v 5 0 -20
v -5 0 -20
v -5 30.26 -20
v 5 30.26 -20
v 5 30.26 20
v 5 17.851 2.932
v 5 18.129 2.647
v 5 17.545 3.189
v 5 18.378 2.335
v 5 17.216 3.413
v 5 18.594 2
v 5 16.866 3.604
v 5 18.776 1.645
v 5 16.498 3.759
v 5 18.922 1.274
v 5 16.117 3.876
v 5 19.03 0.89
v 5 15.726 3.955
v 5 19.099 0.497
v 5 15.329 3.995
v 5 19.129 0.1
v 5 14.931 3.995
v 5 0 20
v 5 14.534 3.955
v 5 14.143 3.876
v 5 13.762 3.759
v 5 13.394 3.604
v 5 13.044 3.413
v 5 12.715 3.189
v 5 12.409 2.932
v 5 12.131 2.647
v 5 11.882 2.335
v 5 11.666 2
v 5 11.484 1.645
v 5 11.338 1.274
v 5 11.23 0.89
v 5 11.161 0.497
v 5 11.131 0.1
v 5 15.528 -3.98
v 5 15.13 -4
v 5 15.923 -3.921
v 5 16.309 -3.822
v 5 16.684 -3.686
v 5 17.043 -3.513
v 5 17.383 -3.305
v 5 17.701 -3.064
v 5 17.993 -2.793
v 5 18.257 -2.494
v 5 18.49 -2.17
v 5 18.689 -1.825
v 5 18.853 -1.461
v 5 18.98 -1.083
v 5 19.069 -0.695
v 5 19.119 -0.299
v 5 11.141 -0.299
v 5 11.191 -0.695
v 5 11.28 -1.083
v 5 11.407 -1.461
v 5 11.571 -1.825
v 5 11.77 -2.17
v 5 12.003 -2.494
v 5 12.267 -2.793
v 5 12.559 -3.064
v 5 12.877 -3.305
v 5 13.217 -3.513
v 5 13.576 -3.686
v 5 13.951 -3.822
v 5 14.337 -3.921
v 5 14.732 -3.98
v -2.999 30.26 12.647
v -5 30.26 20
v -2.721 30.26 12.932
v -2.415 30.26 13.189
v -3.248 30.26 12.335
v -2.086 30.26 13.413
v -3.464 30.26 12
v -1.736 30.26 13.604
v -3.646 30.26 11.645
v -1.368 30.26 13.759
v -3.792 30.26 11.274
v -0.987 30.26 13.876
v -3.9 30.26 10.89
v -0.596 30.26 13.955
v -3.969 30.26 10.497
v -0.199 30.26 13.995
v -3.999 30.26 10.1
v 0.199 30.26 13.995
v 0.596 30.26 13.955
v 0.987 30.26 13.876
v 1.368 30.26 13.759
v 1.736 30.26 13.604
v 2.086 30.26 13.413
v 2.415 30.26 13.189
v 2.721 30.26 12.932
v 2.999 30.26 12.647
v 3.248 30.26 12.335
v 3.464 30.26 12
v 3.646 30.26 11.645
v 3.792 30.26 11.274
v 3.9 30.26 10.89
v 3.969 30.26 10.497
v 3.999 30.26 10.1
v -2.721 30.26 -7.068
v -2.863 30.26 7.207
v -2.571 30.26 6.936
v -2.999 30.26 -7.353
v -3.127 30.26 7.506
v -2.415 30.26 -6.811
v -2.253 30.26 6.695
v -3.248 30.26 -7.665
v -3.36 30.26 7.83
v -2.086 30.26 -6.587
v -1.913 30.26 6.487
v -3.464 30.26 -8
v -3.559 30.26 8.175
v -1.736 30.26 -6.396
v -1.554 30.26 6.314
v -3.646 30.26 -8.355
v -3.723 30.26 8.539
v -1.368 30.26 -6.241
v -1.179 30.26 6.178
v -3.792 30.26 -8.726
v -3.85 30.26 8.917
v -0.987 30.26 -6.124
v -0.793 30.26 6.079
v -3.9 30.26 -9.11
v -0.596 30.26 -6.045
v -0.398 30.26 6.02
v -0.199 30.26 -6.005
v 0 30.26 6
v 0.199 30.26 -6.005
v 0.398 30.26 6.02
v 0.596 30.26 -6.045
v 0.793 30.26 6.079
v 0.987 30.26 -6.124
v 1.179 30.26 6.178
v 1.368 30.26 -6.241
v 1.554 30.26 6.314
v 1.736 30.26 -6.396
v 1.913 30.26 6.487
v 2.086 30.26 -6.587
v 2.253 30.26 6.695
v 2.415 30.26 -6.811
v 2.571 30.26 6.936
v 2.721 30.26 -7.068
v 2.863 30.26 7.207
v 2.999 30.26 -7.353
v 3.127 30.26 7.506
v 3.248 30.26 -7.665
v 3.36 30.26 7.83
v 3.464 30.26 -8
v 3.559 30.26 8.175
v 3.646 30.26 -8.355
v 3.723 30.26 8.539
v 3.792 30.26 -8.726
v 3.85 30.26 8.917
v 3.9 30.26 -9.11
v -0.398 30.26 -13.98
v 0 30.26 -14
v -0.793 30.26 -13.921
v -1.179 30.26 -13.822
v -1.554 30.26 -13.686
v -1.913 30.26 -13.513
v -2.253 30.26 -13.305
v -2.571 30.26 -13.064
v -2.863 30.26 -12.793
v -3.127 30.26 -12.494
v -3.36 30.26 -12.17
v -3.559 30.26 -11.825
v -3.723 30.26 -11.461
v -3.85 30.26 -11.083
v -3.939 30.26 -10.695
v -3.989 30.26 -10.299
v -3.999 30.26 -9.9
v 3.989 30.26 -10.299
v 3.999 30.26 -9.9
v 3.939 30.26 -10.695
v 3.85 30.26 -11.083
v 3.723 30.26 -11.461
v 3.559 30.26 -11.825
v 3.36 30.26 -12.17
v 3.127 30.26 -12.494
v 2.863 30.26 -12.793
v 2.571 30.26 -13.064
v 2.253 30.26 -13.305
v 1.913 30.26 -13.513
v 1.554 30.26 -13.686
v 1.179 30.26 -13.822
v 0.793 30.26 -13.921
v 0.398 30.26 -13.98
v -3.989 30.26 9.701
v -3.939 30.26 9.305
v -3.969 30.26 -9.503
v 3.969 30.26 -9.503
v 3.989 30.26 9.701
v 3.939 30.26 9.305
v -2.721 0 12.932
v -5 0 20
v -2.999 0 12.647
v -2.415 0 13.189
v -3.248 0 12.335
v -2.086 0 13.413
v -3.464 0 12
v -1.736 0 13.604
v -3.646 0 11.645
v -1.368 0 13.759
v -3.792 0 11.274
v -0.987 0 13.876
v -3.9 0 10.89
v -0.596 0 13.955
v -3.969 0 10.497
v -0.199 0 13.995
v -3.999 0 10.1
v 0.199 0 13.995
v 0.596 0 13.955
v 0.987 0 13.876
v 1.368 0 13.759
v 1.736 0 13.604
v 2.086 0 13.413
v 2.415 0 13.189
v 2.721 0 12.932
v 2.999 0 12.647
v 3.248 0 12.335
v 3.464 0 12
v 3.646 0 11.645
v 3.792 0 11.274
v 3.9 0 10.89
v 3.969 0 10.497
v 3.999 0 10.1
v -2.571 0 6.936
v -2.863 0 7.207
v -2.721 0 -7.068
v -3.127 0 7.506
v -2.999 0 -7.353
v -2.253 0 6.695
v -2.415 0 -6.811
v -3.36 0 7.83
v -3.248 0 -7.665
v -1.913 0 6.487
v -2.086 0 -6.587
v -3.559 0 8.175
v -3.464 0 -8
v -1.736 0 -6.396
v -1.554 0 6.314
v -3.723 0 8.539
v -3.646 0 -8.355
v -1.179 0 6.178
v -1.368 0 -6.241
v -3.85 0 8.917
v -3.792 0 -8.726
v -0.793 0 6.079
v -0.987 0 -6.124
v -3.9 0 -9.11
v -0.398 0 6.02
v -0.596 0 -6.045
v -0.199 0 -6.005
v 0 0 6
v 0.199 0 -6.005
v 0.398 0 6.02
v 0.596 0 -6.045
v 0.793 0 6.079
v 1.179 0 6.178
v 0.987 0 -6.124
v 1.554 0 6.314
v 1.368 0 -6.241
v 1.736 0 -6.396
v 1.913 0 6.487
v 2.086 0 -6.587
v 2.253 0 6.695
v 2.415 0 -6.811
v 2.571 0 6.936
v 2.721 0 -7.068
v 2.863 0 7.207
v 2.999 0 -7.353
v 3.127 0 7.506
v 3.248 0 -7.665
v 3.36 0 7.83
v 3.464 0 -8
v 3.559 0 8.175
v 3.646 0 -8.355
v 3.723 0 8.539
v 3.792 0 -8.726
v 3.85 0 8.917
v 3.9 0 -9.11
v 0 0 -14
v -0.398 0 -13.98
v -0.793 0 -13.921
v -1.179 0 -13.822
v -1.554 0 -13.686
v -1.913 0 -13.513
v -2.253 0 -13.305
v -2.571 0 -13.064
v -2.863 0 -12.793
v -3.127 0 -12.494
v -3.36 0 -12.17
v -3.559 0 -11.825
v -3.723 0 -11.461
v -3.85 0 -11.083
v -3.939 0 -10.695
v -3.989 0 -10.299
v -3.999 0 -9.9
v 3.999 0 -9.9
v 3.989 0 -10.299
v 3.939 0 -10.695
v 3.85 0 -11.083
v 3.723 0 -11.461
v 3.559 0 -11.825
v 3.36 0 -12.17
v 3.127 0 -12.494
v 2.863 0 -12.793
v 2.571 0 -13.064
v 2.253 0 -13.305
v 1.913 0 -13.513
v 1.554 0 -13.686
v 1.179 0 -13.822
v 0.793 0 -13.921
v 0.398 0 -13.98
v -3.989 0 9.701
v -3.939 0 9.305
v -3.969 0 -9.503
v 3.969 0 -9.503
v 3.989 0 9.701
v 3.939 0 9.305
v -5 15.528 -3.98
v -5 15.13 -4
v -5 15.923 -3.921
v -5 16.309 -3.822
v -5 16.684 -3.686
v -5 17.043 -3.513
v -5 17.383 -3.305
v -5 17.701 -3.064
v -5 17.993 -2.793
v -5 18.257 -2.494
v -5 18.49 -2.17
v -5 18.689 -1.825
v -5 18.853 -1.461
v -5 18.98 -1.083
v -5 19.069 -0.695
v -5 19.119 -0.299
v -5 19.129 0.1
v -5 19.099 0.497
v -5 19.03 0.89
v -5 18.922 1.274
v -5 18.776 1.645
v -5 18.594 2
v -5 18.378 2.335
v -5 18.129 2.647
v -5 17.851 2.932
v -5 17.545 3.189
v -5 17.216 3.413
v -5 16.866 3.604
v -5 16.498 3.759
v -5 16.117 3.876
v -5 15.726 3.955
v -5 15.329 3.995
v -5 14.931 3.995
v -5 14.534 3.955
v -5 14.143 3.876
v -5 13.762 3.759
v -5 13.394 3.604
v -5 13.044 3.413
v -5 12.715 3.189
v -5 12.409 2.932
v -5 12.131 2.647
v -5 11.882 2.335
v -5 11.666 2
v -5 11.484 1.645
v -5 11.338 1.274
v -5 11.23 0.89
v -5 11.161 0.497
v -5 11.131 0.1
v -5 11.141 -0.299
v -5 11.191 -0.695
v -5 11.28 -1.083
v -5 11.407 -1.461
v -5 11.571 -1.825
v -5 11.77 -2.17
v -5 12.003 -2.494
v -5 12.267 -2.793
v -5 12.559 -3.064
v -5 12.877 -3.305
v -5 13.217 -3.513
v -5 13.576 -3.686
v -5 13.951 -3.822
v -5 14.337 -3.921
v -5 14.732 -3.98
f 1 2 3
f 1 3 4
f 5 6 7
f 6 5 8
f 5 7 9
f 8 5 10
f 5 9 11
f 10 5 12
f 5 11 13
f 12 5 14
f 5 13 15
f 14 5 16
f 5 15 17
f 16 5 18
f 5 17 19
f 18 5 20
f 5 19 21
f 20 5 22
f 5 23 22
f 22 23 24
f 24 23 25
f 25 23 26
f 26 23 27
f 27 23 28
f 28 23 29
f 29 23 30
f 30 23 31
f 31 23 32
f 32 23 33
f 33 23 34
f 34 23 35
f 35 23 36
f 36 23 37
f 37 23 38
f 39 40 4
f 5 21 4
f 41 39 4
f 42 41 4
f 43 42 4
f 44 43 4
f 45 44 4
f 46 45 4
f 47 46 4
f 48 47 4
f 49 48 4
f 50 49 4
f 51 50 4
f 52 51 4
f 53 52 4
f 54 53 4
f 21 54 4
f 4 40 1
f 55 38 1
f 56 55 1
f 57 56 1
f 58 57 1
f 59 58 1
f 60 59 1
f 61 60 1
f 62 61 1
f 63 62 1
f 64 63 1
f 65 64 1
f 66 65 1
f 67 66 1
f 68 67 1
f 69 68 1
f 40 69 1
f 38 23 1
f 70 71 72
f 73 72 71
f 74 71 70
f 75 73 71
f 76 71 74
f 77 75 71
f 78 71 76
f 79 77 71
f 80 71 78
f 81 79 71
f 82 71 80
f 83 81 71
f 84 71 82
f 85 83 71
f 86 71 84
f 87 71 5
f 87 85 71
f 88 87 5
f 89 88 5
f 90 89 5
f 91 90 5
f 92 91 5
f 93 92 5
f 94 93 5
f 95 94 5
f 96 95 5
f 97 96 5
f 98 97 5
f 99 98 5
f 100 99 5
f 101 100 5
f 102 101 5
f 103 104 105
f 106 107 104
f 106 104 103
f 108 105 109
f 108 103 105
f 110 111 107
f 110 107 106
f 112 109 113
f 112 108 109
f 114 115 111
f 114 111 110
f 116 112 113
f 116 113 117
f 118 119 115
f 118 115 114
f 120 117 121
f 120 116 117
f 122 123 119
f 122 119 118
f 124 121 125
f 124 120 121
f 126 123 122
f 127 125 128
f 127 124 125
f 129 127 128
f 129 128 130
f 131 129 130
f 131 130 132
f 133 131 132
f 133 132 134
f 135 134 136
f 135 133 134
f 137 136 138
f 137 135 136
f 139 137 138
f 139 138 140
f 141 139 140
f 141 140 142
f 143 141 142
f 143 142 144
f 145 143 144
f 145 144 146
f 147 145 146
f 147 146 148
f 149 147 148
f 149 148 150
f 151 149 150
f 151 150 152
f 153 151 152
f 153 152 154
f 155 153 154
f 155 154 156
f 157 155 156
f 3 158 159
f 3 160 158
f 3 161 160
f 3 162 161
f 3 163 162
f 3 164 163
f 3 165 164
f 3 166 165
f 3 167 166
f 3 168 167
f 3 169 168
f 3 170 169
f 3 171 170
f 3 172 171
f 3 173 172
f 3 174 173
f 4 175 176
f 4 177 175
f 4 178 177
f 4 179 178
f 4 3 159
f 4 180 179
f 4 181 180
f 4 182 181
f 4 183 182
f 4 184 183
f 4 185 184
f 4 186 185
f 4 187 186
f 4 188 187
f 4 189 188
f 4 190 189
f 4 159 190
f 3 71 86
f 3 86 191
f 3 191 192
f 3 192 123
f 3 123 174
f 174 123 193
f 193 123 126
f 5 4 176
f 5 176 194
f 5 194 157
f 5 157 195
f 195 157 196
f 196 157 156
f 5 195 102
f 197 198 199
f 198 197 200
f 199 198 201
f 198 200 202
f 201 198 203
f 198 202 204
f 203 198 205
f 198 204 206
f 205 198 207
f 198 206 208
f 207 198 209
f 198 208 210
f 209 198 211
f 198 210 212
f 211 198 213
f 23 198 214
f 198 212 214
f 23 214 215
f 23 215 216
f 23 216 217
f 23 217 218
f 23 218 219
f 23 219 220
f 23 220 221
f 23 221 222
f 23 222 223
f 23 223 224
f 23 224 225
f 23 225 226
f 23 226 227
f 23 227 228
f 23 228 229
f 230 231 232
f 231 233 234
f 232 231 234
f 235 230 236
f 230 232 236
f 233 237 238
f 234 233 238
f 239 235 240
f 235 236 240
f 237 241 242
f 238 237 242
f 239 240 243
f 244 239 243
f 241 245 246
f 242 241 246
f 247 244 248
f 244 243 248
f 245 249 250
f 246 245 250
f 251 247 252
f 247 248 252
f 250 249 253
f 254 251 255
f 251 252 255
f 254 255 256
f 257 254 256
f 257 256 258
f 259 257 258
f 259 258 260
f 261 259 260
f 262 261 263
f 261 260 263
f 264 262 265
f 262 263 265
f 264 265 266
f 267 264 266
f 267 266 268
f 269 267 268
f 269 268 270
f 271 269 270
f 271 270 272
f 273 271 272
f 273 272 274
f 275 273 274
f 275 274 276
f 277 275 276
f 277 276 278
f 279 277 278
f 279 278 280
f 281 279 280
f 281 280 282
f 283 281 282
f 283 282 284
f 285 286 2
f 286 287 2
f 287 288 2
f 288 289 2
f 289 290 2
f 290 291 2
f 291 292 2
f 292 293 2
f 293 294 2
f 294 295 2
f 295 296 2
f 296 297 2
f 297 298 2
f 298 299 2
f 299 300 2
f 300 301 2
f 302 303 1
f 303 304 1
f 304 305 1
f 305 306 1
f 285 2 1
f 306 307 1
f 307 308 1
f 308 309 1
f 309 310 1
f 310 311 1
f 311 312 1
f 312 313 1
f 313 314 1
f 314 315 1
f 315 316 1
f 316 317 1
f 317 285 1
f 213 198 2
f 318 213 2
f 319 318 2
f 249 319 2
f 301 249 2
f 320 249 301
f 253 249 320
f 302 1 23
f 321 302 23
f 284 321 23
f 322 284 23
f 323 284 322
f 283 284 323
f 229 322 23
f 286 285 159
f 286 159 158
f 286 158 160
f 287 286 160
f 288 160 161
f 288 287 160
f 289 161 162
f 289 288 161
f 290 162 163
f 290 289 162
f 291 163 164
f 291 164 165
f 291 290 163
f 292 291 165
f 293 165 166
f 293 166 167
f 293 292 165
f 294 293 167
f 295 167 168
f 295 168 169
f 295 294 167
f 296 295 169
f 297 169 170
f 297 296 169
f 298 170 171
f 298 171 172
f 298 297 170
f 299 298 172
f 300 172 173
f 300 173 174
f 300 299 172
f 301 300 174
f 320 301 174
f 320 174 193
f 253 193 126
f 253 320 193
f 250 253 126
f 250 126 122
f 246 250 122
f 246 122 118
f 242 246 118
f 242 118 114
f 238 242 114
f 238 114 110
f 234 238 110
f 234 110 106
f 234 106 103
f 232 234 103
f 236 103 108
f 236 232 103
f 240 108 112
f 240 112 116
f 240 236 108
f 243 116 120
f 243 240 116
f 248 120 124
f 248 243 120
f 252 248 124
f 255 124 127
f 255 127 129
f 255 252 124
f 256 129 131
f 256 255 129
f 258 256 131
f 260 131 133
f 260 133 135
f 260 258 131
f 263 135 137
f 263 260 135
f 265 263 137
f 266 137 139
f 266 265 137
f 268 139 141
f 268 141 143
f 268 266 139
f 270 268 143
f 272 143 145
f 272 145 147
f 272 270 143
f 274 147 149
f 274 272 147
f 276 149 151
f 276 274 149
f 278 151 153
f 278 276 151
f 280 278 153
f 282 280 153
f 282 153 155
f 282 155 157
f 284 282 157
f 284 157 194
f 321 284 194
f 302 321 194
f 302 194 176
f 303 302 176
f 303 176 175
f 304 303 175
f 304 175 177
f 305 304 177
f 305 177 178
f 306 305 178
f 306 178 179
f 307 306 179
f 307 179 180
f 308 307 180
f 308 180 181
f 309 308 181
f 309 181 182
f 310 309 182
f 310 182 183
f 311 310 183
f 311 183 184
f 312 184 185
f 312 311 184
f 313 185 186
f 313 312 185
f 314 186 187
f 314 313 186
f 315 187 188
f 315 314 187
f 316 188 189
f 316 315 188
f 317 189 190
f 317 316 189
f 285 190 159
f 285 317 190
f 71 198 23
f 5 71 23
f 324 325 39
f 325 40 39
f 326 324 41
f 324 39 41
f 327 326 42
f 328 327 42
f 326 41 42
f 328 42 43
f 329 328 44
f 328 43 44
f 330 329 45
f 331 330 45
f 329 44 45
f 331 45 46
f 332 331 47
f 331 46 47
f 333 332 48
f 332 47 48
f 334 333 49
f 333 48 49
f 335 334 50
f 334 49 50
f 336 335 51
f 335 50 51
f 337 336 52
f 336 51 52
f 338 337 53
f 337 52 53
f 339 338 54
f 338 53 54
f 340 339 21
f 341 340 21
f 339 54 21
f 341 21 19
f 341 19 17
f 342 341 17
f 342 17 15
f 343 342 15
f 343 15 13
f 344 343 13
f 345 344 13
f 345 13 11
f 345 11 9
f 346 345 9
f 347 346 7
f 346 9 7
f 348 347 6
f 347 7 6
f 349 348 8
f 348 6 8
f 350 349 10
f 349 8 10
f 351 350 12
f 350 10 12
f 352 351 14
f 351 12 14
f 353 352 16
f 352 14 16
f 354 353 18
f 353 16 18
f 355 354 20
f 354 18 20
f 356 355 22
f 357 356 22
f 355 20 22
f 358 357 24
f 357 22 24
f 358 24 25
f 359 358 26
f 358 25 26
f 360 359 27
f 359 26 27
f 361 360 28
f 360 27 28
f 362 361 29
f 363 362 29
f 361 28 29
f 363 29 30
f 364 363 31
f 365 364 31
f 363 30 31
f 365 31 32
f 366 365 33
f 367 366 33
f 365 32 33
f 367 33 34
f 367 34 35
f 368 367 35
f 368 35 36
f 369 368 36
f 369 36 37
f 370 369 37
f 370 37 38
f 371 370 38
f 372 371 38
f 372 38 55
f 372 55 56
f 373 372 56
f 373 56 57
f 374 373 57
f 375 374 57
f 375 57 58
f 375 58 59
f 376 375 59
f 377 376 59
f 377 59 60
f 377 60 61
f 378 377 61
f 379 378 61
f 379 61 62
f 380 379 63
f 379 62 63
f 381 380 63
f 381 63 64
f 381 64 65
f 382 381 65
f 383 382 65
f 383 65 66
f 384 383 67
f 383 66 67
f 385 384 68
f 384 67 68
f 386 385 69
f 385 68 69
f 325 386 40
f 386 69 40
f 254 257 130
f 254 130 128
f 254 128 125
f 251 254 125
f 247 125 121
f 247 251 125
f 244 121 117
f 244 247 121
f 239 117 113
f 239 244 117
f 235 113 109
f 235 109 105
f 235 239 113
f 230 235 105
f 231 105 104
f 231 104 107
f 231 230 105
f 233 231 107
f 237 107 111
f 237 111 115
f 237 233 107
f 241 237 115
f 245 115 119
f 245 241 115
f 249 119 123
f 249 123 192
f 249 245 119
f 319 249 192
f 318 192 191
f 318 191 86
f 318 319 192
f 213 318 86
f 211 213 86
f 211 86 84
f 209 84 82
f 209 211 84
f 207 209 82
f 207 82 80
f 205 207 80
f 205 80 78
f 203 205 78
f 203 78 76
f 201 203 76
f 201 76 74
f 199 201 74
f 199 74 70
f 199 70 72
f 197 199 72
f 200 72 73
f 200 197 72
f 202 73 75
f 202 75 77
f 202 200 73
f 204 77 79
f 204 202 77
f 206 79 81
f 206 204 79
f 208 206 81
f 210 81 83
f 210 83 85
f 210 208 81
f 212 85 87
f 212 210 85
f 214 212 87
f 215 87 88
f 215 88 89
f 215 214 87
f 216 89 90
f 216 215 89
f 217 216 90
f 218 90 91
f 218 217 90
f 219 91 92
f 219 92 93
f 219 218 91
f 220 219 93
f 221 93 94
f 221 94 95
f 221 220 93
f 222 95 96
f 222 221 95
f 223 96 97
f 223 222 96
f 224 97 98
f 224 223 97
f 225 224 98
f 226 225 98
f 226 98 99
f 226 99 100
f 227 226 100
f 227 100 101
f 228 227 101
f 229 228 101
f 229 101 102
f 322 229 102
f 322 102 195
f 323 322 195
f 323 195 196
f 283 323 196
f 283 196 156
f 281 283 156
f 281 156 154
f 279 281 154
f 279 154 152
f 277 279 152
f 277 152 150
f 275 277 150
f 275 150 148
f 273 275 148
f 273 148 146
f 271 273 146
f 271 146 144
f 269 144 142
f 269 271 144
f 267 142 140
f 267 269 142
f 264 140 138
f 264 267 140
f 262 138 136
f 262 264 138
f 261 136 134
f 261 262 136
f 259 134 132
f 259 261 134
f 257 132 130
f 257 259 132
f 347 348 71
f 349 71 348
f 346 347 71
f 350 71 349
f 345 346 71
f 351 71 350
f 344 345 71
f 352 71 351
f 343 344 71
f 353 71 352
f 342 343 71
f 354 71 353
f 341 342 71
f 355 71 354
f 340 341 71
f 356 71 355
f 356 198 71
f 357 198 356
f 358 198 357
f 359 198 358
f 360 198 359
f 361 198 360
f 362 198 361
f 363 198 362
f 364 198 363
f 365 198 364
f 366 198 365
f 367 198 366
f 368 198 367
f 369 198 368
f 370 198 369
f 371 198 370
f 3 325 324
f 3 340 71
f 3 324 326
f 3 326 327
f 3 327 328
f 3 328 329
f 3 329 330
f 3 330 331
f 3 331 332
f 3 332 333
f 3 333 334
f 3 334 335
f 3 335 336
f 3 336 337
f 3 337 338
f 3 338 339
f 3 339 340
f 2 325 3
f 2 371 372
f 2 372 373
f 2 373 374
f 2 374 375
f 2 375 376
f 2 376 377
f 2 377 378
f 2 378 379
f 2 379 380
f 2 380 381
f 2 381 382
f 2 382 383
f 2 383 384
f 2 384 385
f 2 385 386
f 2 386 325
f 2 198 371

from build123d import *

# Parameters (mm, degrees)
CROQUIS1_W              = 10
CROQUIS1_H              = 40
SALIENTE_EXTRUIR1_DEPTH = 30.26
CROQUIS2_R              = 4
CORTAR_EXTRUIR1_DEPTH   = 30.26
CROQUIS5_R              = 4
CORTAR_EXTRUIR2_DEPTH   = 15.13


with BuildPart() as part:
    # Croquis1 → Saliente-Extruir1 (new body)
    with BuildSketch(Plane(origin=(0, 0, 0), x_dir=(1, 0, 0), z_dir=(0, 1, 0))):
        Rectangle(CROQUIS1_W, CROQUIS1_H)
    extrude(amount=SALIENTE_EXTRUIR1_DEPTH)

    # Croquis2 → Cortar-Extruir1 (cut)
    with BuildSketch(Plane(origin=(0, 0, 0), x_dir=(1, 0, 0), z_dir=(0, 1, 0))):
        with Locations(Location((0, -10, 0), (0, 0, 90))):
            Circle(CROQUIS2_R)
        with Locations(Location((0, 10, 0), (0, 0, 90))):
            Circle(CROQUIS2_R)
    extrude(amount=CORTAR_EXTRUIR1_DEPTH, mode=Mode.SUBTRACT)

    # Croquis5 → Cortar-Extruir2 (cut, symmetric)
    with BuildSketch(Plane(origin=(0, 0, 0), x_dir=(0, 0, -1), z_dir=(1, 0, 0))):
        with Locations((0, 15.13)):
            Circle(CROQUIS5_R)
    extrude(amount=CORTAR_EXTRUIR2_DEPTH, both=True, mode=Mode.SUBTRACT)


solid = part.part
